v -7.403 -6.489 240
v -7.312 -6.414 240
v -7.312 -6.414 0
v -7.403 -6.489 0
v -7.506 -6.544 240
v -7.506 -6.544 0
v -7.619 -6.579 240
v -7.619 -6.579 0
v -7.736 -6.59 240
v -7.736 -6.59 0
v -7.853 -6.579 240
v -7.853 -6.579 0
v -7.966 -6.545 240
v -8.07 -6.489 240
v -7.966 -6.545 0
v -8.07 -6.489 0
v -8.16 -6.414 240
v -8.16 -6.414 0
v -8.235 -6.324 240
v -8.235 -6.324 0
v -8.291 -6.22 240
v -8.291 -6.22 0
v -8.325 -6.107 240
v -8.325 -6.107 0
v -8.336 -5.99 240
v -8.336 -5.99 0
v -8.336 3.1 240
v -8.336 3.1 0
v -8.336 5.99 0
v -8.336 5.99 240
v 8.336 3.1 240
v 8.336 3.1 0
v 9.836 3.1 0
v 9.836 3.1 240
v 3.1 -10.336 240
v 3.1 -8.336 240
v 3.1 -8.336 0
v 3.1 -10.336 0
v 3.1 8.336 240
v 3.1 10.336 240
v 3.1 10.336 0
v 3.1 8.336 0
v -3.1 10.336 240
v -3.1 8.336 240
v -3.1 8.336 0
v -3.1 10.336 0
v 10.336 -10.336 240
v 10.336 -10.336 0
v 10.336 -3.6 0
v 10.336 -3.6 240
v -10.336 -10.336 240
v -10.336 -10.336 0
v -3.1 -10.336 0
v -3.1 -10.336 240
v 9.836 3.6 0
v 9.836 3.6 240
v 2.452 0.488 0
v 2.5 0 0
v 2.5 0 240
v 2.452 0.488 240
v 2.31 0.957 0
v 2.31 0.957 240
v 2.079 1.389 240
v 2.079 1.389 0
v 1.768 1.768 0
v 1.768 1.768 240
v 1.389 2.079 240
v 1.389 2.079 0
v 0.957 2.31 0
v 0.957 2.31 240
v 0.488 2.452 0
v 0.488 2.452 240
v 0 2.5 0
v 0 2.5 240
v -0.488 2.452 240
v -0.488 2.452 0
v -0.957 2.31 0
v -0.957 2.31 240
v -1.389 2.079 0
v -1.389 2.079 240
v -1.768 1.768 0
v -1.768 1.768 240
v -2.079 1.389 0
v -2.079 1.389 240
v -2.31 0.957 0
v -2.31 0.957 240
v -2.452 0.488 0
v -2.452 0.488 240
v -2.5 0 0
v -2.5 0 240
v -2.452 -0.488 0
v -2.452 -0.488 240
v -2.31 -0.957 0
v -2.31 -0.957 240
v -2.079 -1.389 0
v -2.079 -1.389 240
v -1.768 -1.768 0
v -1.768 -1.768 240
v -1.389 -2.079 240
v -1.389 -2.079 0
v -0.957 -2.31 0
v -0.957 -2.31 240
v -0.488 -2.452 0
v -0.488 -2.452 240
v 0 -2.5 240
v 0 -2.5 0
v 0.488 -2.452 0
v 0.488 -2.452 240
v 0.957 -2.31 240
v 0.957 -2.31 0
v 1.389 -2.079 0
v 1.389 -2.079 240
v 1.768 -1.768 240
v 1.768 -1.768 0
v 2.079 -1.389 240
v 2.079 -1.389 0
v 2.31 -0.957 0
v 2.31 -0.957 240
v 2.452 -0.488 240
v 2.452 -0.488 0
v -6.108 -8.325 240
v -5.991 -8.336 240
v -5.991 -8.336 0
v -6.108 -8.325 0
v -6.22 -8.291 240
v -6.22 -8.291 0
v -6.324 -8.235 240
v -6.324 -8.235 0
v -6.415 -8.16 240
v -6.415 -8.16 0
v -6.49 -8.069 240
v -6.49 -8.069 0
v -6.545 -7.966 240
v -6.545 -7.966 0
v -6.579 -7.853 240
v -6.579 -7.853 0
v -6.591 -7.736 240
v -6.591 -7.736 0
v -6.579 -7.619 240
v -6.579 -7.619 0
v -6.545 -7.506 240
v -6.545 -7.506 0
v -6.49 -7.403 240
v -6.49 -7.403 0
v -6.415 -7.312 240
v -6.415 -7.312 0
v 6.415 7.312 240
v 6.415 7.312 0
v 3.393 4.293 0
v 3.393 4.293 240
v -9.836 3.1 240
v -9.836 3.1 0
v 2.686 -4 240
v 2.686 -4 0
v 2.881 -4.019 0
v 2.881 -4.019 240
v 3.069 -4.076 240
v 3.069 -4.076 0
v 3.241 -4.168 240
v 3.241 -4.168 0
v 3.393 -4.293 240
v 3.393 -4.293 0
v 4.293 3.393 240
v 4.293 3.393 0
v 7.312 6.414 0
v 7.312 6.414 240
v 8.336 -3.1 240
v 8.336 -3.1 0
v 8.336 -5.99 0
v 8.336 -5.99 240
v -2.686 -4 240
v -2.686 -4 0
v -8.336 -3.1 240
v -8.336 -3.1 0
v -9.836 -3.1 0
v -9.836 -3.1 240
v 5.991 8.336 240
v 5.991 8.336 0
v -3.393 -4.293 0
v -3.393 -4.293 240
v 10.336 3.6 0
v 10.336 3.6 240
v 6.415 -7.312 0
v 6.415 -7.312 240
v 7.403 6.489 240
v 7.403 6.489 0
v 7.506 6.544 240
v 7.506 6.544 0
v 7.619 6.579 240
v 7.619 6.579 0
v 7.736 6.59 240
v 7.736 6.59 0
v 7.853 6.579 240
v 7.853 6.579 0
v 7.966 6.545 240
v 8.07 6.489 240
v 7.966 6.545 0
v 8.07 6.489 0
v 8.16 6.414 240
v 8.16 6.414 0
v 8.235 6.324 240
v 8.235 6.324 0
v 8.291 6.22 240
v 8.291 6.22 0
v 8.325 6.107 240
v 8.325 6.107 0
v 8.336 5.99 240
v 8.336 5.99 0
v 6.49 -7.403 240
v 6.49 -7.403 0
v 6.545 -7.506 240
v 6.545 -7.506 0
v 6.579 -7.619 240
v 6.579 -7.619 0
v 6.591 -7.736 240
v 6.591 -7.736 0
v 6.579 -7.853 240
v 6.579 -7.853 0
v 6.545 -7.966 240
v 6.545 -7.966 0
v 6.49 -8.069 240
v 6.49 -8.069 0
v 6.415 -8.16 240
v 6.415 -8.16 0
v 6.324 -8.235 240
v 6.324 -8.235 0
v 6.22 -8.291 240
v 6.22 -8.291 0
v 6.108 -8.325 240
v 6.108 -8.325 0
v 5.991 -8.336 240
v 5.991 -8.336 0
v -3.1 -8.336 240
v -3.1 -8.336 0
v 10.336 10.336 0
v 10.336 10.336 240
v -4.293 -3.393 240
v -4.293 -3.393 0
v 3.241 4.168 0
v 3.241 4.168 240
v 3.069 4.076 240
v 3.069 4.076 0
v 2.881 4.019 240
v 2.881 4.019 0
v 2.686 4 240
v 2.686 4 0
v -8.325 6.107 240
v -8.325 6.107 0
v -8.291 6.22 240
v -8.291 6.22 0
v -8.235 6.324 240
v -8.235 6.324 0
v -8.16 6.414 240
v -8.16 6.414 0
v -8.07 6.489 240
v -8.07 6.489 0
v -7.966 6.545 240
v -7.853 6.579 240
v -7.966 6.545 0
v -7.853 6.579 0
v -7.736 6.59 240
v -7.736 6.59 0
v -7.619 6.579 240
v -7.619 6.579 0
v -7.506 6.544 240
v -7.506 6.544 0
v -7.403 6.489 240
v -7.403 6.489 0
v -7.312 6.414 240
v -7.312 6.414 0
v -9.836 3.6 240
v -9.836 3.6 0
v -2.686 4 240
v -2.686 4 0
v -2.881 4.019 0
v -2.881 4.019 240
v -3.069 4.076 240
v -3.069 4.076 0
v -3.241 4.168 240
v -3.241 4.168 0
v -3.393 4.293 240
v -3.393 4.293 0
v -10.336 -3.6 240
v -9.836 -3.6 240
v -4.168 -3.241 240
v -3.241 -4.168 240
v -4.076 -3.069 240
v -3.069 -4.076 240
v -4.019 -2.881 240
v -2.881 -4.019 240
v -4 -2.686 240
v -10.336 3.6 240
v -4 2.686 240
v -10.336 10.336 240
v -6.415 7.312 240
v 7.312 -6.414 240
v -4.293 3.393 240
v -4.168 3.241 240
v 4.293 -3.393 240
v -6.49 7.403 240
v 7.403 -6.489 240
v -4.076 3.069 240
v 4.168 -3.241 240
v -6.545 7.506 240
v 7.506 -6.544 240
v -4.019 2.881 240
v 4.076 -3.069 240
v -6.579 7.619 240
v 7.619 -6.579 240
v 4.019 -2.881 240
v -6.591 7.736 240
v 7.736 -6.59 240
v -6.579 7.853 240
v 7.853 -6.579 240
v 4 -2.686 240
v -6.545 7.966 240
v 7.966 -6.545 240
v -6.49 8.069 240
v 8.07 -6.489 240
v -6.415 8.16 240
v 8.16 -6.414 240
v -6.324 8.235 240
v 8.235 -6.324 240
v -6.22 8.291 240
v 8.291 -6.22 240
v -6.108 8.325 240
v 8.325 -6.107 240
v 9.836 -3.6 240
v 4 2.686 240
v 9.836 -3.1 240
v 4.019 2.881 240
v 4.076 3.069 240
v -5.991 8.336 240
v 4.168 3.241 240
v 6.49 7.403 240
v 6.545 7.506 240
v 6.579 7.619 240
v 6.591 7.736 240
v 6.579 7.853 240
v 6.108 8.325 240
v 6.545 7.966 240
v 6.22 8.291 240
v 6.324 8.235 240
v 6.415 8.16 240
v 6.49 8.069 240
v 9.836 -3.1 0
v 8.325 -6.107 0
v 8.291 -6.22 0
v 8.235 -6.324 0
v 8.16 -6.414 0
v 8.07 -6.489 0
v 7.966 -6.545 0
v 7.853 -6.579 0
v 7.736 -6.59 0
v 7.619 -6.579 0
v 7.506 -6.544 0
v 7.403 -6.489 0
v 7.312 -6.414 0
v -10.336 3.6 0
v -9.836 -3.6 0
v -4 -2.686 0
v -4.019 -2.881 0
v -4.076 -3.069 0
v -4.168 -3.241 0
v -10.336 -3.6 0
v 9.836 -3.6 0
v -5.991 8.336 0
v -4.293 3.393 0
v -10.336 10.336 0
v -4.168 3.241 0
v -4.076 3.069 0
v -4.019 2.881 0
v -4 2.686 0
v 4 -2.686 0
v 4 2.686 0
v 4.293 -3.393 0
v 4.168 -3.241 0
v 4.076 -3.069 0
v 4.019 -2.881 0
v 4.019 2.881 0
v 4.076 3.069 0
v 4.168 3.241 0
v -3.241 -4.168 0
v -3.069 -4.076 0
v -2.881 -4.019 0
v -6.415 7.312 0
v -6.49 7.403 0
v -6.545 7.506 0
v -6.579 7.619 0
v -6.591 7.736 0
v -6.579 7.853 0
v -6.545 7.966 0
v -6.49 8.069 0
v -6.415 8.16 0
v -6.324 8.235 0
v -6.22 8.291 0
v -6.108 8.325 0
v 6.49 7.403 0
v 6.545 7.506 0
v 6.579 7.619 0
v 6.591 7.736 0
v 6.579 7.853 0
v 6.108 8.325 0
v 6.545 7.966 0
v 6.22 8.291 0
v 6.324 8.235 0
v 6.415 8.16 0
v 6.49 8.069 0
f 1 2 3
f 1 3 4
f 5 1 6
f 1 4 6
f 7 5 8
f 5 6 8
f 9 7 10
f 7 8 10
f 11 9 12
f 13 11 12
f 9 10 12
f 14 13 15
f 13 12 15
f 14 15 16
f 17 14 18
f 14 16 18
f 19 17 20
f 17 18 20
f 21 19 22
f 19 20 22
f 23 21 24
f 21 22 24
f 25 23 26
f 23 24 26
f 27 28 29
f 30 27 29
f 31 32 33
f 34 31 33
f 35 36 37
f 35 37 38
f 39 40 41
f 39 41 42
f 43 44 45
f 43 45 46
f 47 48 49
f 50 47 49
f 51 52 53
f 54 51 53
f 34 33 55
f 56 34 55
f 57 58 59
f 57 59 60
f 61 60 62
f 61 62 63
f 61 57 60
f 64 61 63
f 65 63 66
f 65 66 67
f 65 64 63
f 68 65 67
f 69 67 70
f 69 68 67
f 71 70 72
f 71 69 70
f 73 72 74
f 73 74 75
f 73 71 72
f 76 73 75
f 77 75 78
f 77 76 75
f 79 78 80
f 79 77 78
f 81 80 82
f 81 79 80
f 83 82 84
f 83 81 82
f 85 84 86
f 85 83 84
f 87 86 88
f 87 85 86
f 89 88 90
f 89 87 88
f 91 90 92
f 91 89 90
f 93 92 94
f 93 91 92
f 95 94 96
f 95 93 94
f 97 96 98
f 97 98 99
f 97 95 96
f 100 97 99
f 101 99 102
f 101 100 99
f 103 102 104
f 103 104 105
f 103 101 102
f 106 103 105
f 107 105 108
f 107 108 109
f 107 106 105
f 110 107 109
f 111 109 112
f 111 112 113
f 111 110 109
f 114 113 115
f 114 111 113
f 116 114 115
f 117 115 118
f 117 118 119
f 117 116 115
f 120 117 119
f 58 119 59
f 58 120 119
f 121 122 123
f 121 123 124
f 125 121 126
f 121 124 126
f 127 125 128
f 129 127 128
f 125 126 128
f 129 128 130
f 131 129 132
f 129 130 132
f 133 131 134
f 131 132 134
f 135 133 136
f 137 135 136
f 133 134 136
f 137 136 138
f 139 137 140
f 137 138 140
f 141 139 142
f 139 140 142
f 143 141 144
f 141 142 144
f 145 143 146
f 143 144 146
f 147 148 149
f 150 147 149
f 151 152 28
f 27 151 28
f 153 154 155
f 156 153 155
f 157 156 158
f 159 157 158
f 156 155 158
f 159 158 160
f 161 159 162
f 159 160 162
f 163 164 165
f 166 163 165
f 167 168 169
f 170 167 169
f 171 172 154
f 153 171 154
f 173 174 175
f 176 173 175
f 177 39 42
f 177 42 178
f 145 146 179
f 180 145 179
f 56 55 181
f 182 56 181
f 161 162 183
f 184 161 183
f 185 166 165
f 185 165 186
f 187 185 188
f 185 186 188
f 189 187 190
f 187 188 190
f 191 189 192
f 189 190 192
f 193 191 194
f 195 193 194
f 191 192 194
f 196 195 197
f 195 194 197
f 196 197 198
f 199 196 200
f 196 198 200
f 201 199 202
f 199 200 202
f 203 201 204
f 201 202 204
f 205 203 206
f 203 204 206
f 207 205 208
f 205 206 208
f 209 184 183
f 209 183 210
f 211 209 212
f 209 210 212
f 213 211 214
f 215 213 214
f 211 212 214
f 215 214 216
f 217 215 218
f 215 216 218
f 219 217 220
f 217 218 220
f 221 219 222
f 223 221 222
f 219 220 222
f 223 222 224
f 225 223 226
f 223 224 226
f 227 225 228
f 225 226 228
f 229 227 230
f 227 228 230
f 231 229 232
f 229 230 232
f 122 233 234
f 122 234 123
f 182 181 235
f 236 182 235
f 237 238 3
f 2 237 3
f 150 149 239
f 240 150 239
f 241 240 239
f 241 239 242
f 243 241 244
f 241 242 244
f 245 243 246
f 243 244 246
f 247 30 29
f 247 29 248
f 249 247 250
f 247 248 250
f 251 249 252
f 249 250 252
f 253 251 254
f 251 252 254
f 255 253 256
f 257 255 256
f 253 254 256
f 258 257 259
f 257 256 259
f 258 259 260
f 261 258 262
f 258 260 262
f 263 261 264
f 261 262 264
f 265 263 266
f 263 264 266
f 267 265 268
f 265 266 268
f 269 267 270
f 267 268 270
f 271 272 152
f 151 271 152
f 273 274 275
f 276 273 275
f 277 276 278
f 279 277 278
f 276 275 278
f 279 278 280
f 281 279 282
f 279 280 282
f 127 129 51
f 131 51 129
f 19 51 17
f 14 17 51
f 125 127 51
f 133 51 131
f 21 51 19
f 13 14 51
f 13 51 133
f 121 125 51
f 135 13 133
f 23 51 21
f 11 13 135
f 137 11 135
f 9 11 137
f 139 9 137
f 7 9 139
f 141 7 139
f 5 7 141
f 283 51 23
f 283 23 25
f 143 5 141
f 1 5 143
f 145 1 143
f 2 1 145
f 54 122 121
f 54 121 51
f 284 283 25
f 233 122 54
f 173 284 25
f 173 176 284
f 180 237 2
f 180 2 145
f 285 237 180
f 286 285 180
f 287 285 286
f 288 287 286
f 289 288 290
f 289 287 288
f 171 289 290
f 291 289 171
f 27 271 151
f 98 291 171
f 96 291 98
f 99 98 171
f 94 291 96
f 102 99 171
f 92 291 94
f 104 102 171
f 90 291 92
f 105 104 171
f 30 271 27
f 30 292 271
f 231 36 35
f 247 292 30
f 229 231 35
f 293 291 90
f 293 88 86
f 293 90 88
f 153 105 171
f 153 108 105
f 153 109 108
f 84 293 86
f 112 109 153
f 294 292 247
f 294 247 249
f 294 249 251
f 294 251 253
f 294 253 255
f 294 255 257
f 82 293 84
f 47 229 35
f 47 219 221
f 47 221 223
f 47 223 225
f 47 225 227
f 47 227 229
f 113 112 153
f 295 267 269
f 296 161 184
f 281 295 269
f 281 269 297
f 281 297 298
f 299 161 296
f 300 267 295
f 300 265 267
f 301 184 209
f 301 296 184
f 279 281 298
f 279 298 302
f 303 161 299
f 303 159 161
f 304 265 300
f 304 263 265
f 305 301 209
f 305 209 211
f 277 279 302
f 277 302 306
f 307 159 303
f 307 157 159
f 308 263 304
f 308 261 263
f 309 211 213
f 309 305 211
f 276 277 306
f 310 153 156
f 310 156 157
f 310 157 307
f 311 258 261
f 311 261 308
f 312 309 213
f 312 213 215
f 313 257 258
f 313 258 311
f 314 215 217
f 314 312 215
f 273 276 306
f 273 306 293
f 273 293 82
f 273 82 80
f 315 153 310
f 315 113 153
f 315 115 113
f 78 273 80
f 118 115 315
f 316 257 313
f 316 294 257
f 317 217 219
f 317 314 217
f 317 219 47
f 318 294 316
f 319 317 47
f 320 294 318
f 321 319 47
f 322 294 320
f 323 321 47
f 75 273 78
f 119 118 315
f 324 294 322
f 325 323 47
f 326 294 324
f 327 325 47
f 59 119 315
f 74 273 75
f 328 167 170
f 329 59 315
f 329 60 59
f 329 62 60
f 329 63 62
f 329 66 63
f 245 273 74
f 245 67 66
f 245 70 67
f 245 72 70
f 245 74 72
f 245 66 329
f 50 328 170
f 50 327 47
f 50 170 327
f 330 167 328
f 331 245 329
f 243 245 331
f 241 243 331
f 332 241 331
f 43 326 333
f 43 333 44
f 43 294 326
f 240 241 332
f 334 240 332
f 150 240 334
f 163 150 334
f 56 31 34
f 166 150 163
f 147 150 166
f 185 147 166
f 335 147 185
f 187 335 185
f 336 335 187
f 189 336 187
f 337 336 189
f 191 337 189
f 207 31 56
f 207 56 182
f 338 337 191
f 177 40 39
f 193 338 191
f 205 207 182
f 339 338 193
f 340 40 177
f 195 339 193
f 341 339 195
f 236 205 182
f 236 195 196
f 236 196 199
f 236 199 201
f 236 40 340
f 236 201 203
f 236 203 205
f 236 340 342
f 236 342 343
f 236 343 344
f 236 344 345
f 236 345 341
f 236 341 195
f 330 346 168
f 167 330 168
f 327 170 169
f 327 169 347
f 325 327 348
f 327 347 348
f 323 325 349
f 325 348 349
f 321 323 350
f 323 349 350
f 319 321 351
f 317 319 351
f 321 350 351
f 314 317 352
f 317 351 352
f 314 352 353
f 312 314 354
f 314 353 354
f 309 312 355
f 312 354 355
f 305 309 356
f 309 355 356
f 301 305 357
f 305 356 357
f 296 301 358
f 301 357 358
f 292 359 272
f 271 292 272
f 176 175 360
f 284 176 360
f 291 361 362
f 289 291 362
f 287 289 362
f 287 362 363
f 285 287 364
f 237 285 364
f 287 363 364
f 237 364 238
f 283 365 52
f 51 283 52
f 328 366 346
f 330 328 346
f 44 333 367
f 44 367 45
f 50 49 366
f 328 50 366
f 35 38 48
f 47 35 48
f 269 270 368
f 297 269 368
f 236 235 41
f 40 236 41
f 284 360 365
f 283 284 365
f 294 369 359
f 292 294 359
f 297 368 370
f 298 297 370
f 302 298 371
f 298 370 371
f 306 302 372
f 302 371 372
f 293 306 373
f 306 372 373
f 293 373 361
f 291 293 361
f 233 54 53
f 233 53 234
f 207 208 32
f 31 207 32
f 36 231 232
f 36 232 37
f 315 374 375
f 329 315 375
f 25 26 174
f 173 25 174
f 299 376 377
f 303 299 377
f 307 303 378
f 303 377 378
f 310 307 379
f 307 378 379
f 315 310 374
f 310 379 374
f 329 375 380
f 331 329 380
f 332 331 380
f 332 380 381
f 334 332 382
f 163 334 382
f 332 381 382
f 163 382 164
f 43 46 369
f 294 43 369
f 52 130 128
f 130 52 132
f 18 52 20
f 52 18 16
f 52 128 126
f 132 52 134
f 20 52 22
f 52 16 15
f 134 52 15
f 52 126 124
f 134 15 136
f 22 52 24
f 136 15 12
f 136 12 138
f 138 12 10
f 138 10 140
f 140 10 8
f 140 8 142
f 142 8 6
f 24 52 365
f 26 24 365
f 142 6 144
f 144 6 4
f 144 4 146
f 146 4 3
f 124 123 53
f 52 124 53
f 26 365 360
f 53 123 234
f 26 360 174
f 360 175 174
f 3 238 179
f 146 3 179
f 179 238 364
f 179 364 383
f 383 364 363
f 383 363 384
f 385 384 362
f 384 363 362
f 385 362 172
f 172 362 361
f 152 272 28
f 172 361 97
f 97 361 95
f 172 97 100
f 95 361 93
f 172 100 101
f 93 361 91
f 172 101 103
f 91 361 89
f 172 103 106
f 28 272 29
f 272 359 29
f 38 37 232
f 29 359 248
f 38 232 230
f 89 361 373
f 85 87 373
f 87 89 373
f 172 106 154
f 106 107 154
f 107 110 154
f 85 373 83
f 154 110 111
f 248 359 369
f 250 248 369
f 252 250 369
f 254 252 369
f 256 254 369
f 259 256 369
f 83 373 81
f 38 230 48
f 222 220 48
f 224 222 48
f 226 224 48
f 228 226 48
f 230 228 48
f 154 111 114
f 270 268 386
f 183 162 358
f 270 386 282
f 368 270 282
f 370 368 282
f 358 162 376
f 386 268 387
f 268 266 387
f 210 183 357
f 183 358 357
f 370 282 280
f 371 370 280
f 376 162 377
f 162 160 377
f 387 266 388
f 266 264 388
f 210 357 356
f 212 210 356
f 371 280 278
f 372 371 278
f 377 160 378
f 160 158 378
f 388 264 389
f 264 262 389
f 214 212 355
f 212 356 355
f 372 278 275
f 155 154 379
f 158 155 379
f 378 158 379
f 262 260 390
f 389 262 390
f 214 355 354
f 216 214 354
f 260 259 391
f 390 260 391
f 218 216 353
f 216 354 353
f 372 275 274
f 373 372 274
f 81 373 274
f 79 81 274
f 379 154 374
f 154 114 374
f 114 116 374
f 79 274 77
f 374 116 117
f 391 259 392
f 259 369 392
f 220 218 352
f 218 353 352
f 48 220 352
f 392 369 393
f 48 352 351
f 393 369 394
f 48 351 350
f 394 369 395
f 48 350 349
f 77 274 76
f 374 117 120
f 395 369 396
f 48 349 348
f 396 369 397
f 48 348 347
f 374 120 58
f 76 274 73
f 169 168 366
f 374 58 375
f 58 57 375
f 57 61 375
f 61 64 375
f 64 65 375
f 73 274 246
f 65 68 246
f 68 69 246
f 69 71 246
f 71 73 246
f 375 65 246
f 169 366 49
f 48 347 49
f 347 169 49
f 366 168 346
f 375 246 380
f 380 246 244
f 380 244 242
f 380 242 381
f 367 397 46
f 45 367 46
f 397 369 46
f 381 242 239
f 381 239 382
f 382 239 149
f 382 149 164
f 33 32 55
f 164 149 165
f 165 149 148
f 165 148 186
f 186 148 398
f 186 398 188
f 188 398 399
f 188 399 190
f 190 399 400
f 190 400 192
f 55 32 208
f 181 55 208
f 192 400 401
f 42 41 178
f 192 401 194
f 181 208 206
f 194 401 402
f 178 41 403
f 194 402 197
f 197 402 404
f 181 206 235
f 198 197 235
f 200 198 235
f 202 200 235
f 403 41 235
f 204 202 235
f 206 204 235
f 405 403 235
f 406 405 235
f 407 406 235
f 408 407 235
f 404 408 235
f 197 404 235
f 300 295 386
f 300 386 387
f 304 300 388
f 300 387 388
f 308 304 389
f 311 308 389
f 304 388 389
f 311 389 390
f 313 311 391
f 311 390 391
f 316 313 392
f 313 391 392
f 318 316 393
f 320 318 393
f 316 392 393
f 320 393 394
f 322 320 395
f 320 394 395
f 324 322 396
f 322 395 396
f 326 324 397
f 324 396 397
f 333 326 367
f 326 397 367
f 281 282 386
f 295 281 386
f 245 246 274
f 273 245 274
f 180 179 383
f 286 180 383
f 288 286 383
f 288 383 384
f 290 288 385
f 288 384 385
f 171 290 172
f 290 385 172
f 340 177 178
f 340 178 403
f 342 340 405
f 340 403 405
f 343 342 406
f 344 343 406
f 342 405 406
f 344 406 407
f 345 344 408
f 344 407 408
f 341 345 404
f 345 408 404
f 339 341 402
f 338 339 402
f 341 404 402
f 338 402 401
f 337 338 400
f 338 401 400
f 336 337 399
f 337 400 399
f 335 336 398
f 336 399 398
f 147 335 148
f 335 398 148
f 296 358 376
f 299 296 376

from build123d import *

# Parameters (mm, degrees)
SKETCH2_R           = 2.5
BOSS_EXTRUDE2_DEPTH = 240


with BuildPart() as part:
    # Sketch2 → Boss-Extrude2 (new body)
    with BuildSketch(Plane.XY):
        with BuildLine():
            Line((-10.33624689, -3.6), (-10.33624689, -10.33624689))
            Line((-10.33624689, -10.33624689), (-3.1, -10.33624689))
            Line((-3.1, -10.33624689), (-3.1, -8.33624689))
            Line((-3.1, -8.33624689), (-5.990764132, -8.33624689))
            ThreePointArc((-5.990764132, -8.33624689), (-6.545144596, -7.965729571), (-6.414833183, -7.311787894))
            Line((-6.414833183, -7.311787894), (-3.392837365, -4.29256834))
            ThreePointArc((-3.392837365, -4.29256834), (-3.068526748, -4.07603256), (-2.686055612, -4))
            Line((-2.686055612, -4), (2.686055612, -4))
            ThreePointArc((2.686055612, -4), (3.068526748, -4.07603256), (3.392837365, -4.29256834))
            Line((3.392837365, -4.29256834), (6.414833183, -7.311787894))
            ThreePointArc((6.414833183, -7.311787894), (6.545144596, -7.965729571), (5.990764132, -8.33624689))
            Line((5.990764132, -8.33624689), (3.1, -8.33624689))
            Line((3.1, -8.33624689), (3.1, -10.33624689))
            Line((3.1, -10.33624689), (10.33624689, -10.33624689))
            Line((10.33624689, -10.33624689), (10.33624689, -3.6))
            Line((10.33624689, -3.6), (9.83624689, -3.6))
            Line((9.83624689, -3.6), (9.83624689, -3.1))
            Line((9.83624689, -3.1), (8.33624689, -3.1))
            Line((8.33624689, -3.1), (8.33624689, -5.99013487))
            ThreePointArc((8.33624689, -5.99013487), (7.965755883, -6.544504441), (7.31182815, -6.414244211))
            Line((7.31182815, -6.414244211), (4.292635434, -3.392848919))
            ThreePointArc((4.292635434, -3.392848919), (4.076050714, -3.068515006), (4, -2.686000016))
            Line((4, -2.686000016), (4, 2.686000016))
            ThreePointArc((4, 2.686000016), (4.076050714, 3.068515006), (4.292635434, 3.392848919))
            Line((4.292635434, 3.392848919), (7.31182815, 6.414244211))
            ThreePointArc((7.31182815, 6.414244211), (7.965755883, 6.544504441), (8.33624689, 5.99013487))
            Line((8.33624689, 5.99013487), (8.33624689, 3.1))
            Line((8.33624689, 3.1), (9.83624689, 3.1))
            Line((9.83624689, 3.1), (9.83624689, 3.6))
            Line((9.83624689, 3.6), (10.33624689, 3.6))
            Line((10.33624689, 3.6), (10.33624689, 10.33624689))
            Line((10.33624689, 10.33624689), (3.1, 10.33624689))
            Line((3.1, 10.33624689), (3.1, 8.33624689))
            Line((3.1, 8.33624689), (5.990764132, 8.33624689))
            ThreePointArc((5.990764132, 8.33624689), (6.545144596, 7.965729571), (6.414833183, 7.311787894))
            Line((6.414833183, 7.311787894), (3.392837365, 4.29256834))
            ThreePointArc((3.392837365, 4.29256834), (3.068526748, 4.07603256), (2.686055612, 4))
            Line((2.686055612, 4), (-2.686055612, 4))
            ThreePointArc((-2.686055612, 4), (-3.068526748, 4.07603256), (-3.392837365, 4.29256834))
            Line((-3.392837365, 4.29256834), (-6.414833183, 7.311787894))
            ThreePointArc((-6.414833183, 7.311787894), (-6.545144596, 7.965729571), (-5.990764132, 8.33624689))
            Line((-5.990764132, 8.33624689), (-3.1, 8.33624689))
            Line((-3.1, 8.33624689), (-3.1, 10.33624689))
            Line((-3.1, 10.33624689), (-10.33624689, 10.33624689))
            Line((-10.33624689, 10.33624689), (-10.33624689, 3.6))
            Line((-10.33624689, 3.6), (-9.83624689, 3.6))
            Line((-9.83624689, 3.6), (-9.83624689, 3.1))
            Line((-9.83624689, 3.1), (-8.33624689, 3.1))
            Line((-8.33624689, 3.1), (-8.33624689, 5.99013487))
            ThreePointArc((-8.33624689, 5.99013487), (-7.965755883, 6.544504441), (-7.31182815, 6.414244211))
            Line((-7.31182815, 6.414244211), (-4.292635434, 3.392848919))
            ThreePointArc((-4.292635434, 3.392848919), (-4.076050714, 3.068515006), (-4, 2.686000016))
            Line((-4, 2.686000016), (-4, -2.686000016))
            ThreePointArc((-4, -2.686000016), (-4.076050714, -3.068515006), (-4.292635434, -3.392848919))
            Line((-4.292635434, -3.392848919), (-7.31182815, -6.414244211))
            ThreePointArc((-7.31182815, -6.414244211), (-7.965755883, -6.544504441), (-8.33624689, -5.99013487))
            Line((-8.33624689, -5.99013487), (-8.33624689, -3.1))
            Line((-8.33624689, -3.1), (-9.83624689, -3.1))
            Line((-9.83624689, -3.1), (-9.83624689, -3.6))
            Line((-9.83624689, -3.6), (-10.33624689, -3.6))
        make_face()
        Circle(SKETCH2_R, mode=Mode.SUBTRACT)
    extrude(amount=BOSS_EXTRUDE2_DEPTH)


solid = part.part
